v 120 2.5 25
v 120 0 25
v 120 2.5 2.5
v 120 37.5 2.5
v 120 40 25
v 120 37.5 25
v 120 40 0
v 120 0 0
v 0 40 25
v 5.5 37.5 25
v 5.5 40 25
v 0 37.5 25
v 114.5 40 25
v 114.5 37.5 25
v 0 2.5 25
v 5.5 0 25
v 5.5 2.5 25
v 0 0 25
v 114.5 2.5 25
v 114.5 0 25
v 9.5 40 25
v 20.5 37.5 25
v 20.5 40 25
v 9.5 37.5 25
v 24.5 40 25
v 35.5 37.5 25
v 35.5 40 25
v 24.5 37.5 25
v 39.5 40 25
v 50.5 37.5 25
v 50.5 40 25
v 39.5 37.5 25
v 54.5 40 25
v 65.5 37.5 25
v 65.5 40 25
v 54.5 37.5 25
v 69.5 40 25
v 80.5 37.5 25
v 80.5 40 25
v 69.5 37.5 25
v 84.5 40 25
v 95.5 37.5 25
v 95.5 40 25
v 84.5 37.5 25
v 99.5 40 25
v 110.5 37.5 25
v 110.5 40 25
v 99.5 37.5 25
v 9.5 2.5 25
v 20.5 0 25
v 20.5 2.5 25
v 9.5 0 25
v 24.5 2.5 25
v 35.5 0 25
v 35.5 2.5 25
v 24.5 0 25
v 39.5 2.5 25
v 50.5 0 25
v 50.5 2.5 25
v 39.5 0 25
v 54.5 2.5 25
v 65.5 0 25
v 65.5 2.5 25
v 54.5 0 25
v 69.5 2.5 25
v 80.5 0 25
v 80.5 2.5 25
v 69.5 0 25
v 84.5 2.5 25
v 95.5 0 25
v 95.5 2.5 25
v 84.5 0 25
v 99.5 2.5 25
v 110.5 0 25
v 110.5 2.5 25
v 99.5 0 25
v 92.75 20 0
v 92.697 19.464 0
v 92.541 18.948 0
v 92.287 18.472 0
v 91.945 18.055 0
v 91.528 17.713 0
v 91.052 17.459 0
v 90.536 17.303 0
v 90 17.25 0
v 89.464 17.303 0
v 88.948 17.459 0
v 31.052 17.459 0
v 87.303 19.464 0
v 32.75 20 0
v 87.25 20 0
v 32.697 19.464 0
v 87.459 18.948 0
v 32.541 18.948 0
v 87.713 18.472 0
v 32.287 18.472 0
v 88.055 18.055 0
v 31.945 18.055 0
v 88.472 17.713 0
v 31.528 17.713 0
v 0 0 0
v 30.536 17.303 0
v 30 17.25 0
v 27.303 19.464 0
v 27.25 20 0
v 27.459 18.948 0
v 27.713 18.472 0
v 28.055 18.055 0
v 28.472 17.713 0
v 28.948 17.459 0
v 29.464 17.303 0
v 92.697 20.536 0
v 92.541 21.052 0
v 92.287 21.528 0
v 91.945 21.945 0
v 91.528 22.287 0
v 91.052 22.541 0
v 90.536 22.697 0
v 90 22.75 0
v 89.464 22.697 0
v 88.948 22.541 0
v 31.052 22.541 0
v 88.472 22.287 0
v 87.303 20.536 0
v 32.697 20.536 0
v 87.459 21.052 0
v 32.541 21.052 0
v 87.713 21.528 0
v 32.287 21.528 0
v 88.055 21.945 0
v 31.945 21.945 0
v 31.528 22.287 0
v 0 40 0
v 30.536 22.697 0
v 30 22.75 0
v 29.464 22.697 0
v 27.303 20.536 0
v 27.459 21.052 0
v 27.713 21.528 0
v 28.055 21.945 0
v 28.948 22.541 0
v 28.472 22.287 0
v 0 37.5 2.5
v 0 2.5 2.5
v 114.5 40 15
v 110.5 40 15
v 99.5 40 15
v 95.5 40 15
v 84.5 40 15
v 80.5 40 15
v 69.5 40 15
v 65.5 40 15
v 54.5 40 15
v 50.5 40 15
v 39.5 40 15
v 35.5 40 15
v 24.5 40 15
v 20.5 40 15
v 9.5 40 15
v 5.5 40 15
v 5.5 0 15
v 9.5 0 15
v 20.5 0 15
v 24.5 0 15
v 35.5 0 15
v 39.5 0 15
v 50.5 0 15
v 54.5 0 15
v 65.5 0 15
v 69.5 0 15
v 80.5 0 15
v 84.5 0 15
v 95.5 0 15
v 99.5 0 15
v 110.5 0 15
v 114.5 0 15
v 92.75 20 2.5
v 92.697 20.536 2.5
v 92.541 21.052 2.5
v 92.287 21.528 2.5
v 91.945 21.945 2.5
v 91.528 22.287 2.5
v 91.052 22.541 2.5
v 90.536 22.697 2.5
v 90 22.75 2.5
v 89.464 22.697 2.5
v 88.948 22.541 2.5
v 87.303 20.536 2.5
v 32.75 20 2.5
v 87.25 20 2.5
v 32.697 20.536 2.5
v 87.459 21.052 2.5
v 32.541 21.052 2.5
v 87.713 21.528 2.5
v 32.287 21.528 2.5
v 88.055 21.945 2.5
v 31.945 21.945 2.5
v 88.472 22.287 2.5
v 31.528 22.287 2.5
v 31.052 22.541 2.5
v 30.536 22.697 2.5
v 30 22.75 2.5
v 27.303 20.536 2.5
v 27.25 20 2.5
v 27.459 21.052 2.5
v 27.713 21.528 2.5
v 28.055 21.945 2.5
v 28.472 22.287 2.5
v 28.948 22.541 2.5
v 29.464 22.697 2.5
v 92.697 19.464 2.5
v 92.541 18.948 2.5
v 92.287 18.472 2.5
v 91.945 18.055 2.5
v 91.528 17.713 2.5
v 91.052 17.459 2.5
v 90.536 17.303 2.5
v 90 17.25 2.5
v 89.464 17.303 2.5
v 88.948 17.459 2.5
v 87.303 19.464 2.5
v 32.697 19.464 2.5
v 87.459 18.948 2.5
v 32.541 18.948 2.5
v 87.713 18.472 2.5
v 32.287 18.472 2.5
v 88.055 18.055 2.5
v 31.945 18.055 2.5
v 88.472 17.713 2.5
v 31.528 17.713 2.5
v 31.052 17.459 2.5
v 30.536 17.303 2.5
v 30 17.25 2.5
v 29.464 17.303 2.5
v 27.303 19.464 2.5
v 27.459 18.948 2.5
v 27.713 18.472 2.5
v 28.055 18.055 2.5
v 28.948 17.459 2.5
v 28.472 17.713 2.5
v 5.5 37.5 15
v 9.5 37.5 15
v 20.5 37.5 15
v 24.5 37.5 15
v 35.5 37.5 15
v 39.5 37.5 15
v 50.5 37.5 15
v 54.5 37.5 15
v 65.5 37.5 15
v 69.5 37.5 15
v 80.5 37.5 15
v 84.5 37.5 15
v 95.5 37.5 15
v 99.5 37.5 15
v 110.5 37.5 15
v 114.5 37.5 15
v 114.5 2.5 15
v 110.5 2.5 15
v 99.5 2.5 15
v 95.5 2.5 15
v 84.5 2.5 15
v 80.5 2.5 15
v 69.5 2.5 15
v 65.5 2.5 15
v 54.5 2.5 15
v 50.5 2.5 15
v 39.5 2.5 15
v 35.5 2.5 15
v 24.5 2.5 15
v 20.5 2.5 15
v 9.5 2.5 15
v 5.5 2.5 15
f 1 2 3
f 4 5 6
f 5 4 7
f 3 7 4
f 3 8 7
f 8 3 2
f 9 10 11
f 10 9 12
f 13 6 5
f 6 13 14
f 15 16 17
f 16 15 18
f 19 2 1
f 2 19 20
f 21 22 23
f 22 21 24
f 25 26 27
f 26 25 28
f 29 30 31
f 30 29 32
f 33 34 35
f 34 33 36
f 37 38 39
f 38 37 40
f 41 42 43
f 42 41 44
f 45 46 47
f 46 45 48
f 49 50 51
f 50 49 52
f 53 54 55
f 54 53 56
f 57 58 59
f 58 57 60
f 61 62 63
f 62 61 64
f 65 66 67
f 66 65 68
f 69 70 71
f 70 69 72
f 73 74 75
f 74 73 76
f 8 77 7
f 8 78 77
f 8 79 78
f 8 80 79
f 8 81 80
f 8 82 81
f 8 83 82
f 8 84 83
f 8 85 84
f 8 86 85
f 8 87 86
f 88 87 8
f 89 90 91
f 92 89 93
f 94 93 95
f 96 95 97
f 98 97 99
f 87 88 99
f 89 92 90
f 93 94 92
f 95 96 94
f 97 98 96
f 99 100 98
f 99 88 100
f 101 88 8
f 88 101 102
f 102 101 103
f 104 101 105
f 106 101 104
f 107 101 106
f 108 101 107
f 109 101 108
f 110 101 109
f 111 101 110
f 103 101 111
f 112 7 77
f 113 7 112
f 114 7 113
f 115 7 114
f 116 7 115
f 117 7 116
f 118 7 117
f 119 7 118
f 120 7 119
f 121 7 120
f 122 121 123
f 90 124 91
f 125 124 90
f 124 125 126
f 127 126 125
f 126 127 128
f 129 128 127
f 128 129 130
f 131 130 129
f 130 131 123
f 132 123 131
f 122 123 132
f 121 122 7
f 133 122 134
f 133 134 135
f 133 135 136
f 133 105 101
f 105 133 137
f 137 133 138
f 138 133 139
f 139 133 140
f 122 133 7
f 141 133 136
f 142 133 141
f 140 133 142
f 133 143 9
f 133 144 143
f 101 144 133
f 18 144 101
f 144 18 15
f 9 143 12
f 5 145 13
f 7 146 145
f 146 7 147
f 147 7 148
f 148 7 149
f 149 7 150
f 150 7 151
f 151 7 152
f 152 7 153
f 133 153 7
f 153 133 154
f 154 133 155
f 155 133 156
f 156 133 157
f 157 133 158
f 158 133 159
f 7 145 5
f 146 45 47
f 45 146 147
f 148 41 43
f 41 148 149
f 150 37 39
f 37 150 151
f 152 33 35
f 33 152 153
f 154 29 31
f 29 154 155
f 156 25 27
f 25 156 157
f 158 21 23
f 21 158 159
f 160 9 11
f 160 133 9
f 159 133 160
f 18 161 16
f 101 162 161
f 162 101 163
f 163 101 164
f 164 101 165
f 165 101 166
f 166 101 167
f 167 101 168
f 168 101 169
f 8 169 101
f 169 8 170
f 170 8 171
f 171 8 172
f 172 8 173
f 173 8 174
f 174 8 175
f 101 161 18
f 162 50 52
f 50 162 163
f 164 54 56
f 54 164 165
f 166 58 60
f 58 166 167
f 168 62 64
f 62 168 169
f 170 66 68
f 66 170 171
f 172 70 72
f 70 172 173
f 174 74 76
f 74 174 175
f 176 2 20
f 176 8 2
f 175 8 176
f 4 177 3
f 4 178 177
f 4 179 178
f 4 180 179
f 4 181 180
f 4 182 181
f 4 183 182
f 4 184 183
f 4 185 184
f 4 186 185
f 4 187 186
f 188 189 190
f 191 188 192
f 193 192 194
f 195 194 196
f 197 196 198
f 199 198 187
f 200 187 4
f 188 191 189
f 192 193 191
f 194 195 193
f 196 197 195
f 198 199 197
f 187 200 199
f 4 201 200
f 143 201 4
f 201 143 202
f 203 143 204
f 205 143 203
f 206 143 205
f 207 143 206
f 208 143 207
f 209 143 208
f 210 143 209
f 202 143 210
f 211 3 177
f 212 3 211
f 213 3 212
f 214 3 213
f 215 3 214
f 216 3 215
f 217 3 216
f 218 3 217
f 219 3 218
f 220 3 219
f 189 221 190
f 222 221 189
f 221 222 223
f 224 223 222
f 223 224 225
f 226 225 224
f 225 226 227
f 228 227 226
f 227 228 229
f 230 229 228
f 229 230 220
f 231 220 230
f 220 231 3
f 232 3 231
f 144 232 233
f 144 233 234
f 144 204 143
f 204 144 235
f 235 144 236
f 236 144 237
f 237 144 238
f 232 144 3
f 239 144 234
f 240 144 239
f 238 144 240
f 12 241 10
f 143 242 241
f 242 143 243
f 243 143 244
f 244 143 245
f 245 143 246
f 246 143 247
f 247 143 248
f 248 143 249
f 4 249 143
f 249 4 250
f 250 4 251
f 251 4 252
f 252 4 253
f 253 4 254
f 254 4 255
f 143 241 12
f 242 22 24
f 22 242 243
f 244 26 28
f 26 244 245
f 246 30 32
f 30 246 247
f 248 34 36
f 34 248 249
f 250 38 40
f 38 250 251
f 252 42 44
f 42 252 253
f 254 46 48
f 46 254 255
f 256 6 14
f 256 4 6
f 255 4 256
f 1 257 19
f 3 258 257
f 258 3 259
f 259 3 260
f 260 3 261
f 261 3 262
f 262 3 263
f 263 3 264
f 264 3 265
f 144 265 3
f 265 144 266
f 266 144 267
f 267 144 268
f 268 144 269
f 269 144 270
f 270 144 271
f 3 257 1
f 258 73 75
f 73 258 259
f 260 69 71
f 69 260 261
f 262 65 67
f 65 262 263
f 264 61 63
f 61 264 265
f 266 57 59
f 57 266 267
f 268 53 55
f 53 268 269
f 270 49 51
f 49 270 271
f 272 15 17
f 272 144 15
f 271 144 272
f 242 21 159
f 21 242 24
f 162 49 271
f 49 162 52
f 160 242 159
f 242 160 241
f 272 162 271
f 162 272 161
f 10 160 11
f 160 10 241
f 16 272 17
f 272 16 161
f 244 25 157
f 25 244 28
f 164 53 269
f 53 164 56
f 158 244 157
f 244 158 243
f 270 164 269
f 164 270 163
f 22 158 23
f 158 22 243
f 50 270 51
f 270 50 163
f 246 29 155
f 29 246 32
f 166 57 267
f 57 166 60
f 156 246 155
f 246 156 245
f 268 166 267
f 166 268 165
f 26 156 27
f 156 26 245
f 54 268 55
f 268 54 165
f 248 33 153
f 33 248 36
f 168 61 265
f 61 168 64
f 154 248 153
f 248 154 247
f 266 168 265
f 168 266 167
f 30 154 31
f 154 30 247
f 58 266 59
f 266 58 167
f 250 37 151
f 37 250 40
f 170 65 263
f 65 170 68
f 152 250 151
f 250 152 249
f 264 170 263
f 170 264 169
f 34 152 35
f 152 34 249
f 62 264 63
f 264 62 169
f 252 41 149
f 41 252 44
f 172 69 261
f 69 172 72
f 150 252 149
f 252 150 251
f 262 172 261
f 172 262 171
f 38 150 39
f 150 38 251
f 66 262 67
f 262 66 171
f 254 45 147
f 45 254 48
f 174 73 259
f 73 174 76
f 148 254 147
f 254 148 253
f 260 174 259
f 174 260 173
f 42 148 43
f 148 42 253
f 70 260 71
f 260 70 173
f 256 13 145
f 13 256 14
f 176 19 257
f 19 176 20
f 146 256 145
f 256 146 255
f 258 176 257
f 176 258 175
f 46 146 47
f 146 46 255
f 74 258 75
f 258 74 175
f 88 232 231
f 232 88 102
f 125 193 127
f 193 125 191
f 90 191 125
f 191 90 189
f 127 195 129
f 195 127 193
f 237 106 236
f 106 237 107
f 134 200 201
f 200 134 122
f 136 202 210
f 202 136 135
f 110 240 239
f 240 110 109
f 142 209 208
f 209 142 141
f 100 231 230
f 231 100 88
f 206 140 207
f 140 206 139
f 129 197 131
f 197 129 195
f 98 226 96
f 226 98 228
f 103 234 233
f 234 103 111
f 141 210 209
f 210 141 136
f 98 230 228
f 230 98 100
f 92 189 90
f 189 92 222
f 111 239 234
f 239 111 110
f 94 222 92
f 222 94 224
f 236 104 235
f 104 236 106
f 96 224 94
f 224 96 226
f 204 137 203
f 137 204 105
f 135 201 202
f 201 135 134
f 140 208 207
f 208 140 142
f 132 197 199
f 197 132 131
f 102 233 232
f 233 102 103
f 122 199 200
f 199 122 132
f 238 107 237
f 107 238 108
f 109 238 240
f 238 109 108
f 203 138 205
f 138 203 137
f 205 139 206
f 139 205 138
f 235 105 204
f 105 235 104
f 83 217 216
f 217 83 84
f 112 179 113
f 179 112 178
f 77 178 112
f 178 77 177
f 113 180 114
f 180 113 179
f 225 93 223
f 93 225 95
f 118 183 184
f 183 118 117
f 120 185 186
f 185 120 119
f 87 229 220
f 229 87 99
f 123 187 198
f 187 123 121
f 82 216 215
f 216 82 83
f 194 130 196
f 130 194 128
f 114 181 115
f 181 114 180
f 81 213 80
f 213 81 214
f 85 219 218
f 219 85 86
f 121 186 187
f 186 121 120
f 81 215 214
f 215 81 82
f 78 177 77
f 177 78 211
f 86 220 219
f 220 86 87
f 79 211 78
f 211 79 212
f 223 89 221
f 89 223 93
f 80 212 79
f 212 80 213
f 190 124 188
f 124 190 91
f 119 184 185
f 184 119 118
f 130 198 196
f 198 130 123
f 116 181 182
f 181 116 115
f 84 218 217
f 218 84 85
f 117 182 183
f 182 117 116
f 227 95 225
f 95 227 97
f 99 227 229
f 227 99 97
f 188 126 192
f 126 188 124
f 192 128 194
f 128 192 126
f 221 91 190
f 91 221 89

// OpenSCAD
$fn = 32;

// ----------------------------------------------------------------------
// Cable duct: 120 x 40 x 25 mm, 8 fingers
// ----------------------------------------------------------------------

// --- parameters (mm) ---
duct_len = 120;           // duct length, X
duct_w = 40;              // duct width, Y
duct_h = 25;              // duct height, Z
wall_t = 2.5;             // side wall thickness
floor_t = 2.5;            // floor thickness
slot_w = 4;               // finger slot width
slot_h = 12.5;            // finger slot height
fingers = 8;              // number of finger slots per side
pitch = 15;               // finger pitch
hole_d = 5.5;             // floor mounting hole
hole_n = 2;               // mounting holes in the floor

module shell() {
  difference() {
    cube([duct_len, duct_w, duct_h]);
    /* open top channel */
    translate([-wall_t - 1, wall_t, floor_t])
      cube([duct_len + 2 * wall_t + 2, duct_w - 2 * wall_t, duct_h + 1]);
  }
}

difference() {
  union() {
    shell();
  }
  /* finger slots cut through both side walls */
  for (i = [0 : fingers - 1]) translate([pitch / 2 + i * pitch - slot_w / 2, -1, floor_t + slot_h]) cube([slot_w, duct_w + 2, duct_h]);
  for (i = [0 : hole_n - 1]) translate([(duct_len / hole_n) * (i + 0.5), duct_w / 2, -1]) cylinder(h = floor_t + 2, d = hole_d);
}
